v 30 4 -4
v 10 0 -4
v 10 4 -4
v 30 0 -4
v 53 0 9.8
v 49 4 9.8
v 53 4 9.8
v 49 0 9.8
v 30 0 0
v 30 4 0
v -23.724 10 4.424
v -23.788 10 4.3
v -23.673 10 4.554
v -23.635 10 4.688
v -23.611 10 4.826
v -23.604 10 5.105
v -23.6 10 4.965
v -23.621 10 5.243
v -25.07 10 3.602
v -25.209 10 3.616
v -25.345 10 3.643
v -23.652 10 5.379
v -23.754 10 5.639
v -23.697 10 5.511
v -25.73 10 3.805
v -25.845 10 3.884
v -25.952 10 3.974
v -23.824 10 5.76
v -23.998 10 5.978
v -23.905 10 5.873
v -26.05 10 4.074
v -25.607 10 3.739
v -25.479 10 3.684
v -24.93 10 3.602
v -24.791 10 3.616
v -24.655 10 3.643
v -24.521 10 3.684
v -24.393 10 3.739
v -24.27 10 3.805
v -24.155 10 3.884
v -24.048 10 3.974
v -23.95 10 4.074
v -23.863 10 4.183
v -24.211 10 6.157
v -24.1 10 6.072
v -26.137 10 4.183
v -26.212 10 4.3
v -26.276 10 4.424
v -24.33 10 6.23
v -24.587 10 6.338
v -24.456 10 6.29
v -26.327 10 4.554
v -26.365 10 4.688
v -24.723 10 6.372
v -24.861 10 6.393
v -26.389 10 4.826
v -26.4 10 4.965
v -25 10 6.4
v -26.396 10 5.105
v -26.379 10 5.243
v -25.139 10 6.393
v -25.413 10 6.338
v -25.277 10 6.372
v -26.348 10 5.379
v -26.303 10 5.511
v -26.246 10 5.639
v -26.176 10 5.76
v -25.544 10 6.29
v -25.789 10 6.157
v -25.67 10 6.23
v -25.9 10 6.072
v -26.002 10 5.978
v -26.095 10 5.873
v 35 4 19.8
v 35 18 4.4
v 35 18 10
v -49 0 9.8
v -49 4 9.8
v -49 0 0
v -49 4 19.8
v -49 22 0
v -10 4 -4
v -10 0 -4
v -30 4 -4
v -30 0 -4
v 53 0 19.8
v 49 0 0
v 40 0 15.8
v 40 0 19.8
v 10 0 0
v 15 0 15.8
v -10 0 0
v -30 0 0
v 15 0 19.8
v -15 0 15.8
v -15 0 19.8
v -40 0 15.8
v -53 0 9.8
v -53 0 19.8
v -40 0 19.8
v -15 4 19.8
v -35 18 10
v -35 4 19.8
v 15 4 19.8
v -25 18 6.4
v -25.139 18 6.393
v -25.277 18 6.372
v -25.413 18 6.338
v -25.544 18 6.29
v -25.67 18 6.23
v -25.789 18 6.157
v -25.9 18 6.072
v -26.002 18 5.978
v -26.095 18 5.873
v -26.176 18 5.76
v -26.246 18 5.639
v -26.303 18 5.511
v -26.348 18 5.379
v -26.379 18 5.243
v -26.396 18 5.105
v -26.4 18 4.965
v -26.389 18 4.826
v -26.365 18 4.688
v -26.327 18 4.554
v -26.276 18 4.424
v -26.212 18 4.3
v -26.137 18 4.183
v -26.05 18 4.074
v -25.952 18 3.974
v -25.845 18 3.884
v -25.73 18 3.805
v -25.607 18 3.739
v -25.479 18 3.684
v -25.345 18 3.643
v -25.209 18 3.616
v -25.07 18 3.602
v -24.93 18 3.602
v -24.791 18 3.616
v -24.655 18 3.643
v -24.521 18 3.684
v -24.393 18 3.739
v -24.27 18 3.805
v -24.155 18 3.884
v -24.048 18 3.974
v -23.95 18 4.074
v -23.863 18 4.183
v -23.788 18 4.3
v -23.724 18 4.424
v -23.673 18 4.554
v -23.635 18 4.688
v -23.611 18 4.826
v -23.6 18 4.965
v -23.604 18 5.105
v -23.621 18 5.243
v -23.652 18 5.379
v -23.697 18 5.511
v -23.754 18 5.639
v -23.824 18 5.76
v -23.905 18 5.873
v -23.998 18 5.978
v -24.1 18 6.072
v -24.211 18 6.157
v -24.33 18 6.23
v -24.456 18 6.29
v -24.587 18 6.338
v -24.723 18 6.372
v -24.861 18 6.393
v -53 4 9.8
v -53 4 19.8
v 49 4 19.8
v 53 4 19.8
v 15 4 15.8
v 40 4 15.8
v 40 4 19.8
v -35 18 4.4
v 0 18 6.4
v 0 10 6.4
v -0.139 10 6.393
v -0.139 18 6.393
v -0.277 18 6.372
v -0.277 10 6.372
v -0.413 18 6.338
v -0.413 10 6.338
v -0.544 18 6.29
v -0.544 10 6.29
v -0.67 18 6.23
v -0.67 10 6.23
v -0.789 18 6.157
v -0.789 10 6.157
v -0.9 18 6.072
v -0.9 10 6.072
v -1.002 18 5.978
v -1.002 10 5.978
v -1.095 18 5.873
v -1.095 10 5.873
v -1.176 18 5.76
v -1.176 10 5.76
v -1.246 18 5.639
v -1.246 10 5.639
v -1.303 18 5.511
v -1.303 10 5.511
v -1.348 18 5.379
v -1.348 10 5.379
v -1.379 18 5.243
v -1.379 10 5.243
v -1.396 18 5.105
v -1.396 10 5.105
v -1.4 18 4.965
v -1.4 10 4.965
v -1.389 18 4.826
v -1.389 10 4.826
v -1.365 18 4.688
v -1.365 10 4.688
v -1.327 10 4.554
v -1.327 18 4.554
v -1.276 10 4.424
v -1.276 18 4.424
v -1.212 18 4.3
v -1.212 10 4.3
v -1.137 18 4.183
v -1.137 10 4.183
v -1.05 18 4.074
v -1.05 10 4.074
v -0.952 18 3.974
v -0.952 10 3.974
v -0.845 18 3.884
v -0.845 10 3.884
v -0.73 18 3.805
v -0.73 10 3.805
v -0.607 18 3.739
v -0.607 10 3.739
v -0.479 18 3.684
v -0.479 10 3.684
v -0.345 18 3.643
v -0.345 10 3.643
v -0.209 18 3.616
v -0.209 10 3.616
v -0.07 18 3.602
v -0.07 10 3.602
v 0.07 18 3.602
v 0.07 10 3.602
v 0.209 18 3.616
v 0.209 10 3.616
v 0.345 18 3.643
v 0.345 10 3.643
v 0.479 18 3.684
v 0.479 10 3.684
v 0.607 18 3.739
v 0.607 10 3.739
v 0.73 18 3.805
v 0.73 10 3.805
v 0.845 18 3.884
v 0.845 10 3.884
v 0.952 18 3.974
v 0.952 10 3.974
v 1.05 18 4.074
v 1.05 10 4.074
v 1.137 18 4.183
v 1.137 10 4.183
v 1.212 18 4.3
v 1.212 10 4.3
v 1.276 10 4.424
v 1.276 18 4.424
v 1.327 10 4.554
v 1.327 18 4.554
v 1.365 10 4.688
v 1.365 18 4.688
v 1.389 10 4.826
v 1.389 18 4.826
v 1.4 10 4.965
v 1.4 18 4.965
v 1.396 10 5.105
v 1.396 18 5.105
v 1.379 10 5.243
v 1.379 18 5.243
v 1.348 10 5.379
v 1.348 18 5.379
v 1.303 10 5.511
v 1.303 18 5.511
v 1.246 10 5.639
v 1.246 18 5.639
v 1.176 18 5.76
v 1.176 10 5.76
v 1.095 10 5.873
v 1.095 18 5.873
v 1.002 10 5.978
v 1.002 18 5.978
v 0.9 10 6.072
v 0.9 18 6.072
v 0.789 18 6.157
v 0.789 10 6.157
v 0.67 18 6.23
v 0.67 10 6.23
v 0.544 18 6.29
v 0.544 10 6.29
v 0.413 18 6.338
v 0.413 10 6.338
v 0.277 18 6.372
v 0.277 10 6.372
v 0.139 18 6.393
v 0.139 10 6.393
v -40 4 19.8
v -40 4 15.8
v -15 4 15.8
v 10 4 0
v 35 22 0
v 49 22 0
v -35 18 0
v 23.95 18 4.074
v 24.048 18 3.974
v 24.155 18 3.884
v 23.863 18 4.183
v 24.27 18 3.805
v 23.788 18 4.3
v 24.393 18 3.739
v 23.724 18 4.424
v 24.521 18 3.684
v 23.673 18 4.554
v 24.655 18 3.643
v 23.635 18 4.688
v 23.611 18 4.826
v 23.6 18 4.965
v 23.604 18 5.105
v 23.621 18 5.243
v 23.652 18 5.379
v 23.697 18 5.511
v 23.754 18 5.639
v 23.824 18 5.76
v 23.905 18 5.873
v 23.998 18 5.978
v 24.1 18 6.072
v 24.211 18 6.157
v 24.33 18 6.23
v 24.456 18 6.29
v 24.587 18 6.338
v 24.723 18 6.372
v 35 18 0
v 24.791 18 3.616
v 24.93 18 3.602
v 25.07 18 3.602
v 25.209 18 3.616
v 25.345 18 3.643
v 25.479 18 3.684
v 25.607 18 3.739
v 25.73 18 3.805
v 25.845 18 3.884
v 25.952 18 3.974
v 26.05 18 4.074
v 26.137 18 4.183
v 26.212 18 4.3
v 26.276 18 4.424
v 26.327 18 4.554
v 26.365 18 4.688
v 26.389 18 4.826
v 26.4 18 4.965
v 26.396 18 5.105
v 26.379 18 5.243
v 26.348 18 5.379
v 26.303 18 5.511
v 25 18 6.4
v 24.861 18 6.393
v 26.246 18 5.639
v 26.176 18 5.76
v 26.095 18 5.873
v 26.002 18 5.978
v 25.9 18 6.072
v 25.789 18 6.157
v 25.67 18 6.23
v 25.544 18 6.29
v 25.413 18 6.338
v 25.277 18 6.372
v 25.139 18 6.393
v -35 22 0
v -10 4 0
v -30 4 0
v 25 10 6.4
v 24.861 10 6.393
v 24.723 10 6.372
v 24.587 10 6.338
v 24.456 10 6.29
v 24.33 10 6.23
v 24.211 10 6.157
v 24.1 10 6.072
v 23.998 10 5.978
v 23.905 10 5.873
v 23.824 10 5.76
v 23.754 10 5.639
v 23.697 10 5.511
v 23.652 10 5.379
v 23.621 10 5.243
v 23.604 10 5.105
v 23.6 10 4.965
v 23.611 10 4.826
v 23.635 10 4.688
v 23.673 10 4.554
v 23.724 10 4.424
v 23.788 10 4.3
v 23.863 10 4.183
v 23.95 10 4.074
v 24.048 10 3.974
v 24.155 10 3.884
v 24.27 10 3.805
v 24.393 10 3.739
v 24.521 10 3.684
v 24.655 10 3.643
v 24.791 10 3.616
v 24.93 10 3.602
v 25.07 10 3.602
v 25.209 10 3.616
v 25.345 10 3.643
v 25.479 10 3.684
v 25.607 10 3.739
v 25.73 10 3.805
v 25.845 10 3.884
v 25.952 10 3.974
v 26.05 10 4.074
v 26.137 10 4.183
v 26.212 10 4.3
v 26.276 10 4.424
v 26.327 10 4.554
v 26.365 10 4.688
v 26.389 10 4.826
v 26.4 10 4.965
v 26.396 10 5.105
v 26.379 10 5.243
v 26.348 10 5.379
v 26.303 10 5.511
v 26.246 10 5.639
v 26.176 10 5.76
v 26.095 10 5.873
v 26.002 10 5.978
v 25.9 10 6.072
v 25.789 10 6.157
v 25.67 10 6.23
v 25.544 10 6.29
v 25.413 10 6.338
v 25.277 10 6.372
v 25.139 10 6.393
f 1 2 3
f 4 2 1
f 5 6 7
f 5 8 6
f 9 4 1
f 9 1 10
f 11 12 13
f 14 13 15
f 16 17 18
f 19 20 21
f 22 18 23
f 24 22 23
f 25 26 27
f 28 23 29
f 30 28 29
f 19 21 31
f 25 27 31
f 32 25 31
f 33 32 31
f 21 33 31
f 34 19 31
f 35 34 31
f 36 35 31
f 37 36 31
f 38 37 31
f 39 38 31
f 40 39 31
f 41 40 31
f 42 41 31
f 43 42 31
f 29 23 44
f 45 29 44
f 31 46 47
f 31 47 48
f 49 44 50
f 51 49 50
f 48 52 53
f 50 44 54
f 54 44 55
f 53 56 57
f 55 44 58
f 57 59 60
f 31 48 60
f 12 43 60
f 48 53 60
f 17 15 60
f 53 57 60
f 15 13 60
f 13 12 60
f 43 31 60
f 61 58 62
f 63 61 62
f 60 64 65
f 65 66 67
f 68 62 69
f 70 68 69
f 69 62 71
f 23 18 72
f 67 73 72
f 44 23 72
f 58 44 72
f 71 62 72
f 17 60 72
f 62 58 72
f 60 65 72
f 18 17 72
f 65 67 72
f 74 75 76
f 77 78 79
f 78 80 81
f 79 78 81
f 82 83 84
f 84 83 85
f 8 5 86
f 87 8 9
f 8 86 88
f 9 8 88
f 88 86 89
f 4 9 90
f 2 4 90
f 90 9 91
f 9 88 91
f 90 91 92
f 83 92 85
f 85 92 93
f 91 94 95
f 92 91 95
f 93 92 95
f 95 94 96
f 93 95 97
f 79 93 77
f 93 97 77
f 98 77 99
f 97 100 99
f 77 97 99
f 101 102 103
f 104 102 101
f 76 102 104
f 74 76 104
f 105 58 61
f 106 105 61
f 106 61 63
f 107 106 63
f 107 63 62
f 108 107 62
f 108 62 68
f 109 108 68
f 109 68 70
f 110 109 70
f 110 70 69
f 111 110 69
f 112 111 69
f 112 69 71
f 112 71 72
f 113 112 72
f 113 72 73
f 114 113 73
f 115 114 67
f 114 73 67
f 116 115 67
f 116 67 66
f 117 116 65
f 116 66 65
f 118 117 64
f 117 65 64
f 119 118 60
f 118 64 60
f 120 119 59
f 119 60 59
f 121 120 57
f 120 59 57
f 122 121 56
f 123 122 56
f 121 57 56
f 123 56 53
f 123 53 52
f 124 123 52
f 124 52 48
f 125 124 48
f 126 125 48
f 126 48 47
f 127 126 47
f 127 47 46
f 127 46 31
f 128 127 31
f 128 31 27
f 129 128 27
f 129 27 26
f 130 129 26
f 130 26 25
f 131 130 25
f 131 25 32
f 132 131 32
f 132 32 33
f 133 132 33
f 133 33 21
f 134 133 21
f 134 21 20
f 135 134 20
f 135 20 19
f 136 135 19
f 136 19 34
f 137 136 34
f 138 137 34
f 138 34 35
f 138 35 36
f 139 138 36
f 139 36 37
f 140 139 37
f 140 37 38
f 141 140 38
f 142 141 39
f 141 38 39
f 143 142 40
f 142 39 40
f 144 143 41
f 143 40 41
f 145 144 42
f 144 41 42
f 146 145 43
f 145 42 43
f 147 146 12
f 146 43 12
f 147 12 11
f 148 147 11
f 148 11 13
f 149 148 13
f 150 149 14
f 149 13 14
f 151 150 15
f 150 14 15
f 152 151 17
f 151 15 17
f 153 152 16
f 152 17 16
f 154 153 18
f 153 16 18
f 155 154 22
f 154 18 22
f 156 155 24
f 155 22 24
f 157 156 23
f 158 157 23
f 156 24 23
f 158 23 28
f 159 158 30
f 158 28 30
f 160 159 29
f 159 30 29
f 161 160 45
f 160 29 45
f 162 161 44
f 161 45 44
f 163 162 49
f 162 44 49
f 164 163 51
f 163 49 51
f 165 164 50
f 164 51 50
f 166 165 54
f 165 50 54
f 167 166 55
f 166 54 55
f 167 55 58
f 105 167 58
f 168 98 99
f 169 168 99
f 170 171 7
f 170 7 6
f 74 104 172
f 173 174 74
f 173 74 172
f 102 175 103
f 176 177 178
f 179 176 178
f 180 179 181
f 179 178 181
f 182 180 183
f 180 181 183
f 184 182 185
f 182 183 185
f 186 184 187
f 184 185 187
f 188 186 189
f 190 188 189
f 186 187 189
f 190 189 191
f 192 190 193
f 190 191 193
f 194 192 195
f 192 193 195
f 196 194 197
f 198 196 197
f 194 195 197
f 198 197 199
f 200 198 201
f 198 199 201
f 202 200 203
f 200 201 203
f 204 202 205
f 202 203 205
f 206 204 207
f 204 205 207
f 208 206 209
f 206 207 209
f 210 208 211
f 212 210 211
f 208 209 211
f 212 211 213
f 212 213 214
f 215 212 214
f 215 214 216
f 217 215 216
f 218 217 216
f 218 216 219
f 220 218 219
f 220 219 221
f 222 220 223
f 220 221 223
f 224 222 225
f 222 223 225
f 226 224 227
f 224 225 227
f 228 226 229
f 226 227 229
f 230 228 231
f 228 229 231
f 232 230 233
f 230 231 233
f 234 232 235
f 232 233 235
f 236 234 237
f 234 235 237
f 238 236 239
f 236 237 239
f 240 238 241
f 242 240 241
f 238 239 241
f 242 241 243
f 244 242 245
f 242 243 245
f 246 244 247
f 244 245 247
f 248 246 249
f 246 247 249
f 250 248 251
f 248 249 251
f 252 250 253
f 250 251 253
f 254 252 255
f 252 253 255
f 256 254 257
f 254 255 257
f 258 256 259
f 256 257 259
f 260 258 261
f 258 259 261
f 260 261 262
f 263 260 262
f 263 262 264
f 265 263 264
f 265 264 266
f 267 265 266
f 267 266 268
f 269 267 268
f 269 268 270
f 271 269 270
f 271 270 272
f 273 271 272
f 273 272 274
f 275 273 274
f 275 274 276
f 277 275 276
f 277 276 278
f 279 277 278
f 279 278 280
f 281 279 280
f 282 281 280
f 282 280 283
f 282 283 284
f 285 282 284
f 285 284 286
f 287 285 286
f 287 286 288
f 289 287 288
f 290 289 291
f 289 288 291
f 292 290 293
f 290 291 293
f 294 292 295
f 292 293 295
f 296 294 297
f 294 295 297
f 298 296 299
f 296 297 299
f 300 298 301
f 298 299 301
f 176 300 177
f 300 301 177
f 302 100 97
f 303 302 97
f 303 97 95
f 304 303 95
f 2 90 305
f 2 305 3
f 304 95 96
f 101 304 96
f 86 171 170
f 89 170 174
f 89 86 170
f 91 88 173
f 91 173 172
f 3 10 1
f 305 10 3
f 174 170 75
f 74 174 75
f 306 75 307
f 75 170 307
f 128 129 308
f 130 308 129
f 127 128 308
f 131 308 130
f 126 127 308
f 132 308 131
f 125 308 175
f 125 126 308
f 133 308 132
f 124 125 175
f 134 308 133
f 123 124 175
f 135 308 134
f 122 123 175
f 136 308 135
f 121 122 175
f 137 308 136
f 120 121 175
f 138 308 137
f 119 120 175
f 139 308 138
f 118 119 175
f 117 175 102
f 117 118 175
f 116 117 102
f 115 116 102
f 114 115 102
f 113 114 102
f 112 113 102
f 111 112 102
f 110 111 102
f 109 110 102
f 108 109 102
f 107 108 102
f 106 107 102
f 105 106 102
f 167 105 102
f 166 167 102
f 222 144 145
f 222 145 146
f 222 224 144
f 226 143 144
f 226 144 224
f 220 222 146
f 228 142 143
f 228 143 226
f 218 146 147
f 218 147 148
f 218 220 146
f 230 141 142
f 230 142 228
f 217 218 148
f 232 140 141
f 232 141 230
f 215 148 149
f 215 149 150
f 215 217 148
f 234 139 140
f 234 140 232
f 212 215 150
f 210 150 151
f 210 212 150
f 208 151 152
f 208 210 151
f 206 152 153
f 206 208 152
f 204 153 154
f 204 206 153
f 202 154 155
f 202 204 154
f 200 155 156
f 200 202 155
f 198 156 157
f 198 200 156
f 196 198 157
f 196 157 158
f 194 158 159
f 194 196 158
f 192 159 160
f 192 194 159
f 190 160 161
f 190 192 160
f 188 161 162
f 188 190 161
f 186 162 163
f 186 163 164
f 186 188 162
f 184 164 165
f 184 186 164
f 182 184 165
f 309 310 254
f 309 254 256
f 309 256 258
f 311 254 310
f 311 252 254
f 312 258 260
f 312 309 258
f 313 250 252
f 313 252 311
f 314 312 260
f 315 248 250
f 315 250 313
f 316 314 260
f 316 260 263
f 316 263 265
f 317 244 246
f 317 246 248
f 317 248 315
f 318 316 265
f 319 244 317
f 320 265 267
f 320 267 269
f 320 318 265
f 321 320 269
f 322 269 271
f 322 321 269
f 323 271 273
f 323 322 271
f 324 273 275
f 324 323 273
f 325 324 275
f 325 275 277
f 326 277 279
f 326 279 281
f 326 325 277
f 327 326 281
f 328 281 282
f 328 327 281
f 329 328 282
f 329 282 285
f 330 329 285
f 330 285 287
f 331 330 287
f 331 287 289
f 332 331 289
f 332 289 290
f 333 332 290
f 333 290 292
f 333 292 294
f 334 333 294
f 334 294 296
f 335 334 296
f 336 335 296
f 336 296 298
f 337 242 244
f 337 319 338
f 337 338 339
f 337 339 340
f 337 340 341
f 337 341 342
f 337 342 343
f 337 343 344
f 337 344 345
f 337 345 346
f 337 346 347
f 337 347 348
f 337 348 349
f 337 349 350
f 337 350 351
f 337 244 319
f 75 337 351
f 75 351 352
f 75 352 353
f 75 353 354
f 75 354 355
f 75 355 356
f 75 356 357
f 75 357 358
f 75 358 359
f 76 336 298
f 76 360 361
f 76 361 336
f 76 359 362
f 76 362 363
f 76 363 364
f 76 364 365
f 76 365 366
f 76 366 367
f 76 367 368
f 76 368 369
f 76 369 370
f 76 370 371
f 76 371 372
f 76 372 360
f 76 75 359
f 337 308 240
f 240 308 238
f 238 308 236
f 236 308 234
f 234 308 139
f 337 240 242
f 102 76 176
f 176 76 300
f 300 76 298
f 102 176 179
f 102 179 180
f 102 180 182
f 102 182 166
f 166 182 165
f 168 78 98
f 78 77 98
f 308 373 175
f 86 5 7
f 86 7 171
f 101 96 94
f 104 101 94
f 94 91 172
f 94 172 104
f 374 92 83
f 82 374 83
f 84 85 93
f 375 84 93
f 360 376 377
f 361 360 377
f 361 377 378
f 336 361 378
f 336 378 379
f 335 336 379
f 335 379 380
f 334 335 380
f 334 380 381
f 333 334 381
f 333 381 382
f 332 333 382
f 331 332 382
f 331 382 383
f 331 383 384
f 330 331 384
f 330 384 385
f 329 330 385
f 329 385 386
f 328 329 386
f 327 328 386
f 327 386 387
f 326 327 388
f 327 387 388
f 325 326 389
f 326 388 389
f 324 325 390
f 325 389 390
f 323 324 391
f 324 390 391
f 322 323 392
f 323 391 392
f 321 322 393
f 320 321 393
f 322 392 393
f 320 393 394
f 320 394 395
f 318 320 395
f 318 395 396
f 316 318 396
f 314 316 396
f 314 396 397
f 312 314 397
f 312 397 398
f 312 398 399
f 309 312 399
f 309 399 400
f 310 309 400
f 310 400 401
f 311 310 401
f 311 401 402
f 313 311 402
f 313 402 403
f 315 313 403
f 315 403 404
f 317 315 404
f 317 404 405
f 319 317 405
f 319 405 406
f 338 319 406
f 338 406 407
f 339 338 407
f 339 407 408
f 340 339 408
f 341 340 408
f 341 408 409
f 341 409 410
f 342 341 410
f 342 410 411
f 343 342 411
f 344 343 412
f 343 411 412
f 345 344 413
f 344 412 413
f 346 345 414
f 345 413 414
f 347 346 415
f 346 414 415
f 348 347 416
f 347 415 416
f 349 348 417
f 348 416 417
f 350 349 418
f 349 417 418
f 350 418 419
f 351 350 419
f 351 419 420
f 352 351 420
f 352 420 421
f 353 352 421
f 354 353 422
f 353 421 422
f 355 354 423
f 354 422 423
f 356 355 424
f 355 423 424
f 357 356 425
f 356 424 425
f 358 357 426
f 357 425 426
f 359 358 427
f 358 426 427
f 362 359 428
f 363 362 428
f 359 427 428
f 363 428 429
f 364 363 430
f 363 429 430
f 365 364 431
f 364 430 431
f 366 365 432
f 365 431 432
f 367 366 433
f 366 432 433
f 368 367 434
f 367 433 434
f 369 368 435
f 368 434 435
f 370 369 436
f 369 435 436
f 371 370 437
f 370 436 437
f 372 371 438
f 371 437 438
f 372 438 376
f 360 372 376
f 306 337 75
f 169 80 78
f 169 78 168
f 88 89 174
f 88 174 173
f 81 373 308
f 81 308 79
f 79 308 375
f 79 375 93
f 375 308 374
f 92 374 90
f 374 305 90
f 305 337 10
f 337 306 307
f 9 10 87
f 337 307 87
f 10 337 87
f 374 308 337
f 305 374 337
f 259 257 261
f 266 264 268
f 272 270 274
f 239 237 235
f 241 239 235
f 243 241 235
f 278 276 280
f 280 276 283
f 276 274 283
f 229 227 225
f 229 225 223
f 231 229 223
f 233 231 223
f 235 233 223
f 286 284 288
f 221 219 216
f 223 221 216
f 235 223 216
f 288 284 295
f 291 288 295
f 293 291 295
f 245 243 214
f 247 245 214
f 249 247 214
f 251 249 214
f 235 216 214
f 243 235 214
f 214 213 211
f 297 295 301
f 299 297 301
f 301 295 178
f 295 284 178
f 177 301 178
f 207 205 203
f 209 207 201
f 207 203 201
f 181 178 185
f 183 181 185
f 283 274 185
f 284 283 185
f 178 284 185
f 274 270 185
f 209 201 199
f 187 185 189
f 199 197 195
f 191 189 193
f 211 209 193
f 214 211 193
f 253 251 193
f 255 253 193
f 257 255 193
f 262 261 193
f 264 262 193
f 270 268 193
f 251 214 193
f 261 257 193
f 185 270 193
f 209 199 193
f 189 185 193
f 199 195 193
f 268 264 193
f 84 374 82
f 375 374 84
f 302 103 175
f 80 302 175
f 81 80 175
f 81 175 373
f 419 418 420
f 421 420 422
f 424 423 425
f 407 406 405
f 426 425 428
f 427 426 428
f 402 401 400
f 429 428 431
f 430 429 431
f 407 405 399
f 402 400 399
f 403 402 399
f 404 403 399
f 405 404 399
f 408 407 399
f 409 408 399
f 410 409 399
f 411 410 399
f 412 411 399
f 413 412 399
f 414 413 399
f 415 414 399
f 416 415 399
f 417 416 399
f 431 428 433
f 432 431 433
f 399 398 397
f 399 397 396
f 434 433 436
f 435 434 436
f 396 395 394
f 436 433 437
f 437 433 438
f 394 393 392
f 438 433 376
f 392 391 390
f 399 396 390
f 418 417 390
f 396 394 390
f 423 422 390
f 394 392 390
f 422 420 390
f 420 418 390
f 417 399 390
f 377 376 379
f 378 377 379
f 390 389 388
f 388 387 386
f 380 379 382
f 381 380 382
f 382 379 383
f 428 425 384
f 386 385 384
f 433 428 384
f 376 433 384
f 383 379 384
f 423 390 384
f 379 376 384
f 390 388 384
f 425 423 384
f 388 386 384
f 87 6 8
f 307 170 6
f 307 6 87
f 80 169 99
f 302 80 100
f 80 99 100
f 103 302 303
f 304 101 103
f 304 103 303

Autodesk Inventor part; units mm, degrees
ref_plane "YZ Plane" through (0, 0, 0) normal (1, 0, 0) x (0, 1, 0)
ref_plane "XZ Plane" through (0, 0, 0) normal (0, 1, 0) x (-1, 0, 0)
ref_plane "XY Plane" through (0, 0, 0) normal (0, 0, 1) x (1, 0, 0)
sketch "Эскиз1" plane through (0, 0, 0) normal (0, 1, 0) x (-1, 0, 0)
  line L0 (0, 0) -> (10, 0)
  line L1 (10, 0) -> (10, -4)
  line L2 (10, -4) -> (30, -4)
  line L3 (30, -4) -> (30, 0)
  line L4 (30, 0) -> (49, 0)
  line L5 (49, 0) -> (49, 9.8)
  line L6 (49, 9.8) -> (53, 9.8)
  line L7 (53, 9.8) -> (53, 19.8)
  line L8 (53, 19.8) -> (40, 19.8)
  line L9 (40, 19.8) -> (40, 15.8)
  line L10 (40, 15.8) -> (15, 15.8)
  line L11 (15, 15.8) -> (15, 19.8)
  line L12 (15, 19.8) -> (0, 19.8)
  line L13 (0, 19.8) -> (0, 0)
  line L14 (0, 0) -> (-10, 0)
  line L15 (-10, 0) -> (-10, -4)
  line L16 (-10, -4) -> (-30, -4)
  line L17 (-30, -4) -> (-30, 0)
  line L18 (-30, 0) -> (-49, 0)
  line L19 (-49, 0) -> (-49, 9.8)
  line L20 (-49, 9.8) -> (-53, 9.8)
  line L21 (-53, 9.8) -> (-53, 19.8)
  line L22 (-53, 19.8) -> (-40, 19.8)
  line L23 (-40, 19.8) -> (-40, 15.8)
  line L24 (-40, 15.8) -> (-15, 15.8)
  line L25 (-15, 15.8) -> (-15, 19.8)
  line L26 (-15, 19.8) -> (0, 19.8)
  dimension "d0" = 20
  dimension "d1" = 4
  dimension "d2" = 20
  dimension "d3" = 19
  dimension "d4" = 19.8
  dimension "d5" = 30
  dimension "d6" = 25
  dimension "d7" = 10
extrude "Выдавливание1" add sketch "Эскиз1" along normal blind 4
sketch "Эскиз3" plane through (49, 0, 9.8) normal (1, 0, 0) x (0, 0, -1)
  line L0 (-10, 4) -> (0, 4) projected
  line L1 (-10, 4) -> (9.8, 22)
  line L2 (9.8, 4) -> (13.8, 4) projected
  line L3 (9.8, 22) -> (9.8, 4)
  line L4 (0, 0) -> (9.8, 0) projected
  line L5 (-10, 4) -> (9.8, 4)
  dimension "d10" = 22
extrude "Выдавливание2" add sketch "Эскиз3" against normal up to surface (98 mm away)
sketch "Эскиз6" plane through (10, 0, 0) normal (0, 0, -1) x (-1, 0, 0)
  line L0 (-39, 22) -> (59, 22) projected
  line L1 (-25, 22) -> (45, 22)
  line L2 (45, 22) -> (45, 18)
  line L3 (45, 18) -> (-25, 18)
  line L4 (-25, 18) -> (-25, 22)
  line L5 (0, 0) -> (20, 0) projected
  point P0 (10, 0)
  point P1 (10, 18)
  point P2 (10, 0)
  dimension "d13" = 70
  dimension "d14" = 4
extrude "Выдавливание3" cut sketch "Эскиз6" against normal through all
sketch "Эскиз8" plane through (35, 18, 0) normal (-1, 0, 0) x (0, 0, 1)
  line L0 (0, 4) -> (4.4, 0) projected
  line L1 (0, 0) -> (0, 4) projected
  line L2 (0, 0) -> (4.4, 0) projected
  line L3 (4.4, 0) -> (10, 0)
  line L4 (19.8, -18) -> (19.8, -14) projected
  line L5 (10, 0) -> (19.8, -14)
  line L6 (19.8, -14) -> (4.4, 0)
  line L7 (19.8, -14) -> (0, 4) projected
  line L8 (0, -18) -> (0, 4) projected
  dimension "d17" = 10
extrude "Выдавливание4" add sketch "Эскиз8" along normal up to surface (70 mm away) contours L3 L5 L6
sketch "Эскиз10" plane through (-35, 18, 0) normal (0, 1, 0) x (1, 0, 0)
  line L0 (35, 0) -> (35, -10)
  line L1 (70, -10) -> (0, -10) projected
  point P0 (60, -5)
  point P1 (35, -5)
  point P2 (10, -5)
  dimension "d27" = 5
  dimension "d28" = 50
hole "Отверстие1" at (25, 18, 5) at (0, 18, 5) at (-25, 18, 5) direction (0, -1, 0) diameter 2.8 depth 8
properties part number "sameSpacer" material "Пластик АБС"
